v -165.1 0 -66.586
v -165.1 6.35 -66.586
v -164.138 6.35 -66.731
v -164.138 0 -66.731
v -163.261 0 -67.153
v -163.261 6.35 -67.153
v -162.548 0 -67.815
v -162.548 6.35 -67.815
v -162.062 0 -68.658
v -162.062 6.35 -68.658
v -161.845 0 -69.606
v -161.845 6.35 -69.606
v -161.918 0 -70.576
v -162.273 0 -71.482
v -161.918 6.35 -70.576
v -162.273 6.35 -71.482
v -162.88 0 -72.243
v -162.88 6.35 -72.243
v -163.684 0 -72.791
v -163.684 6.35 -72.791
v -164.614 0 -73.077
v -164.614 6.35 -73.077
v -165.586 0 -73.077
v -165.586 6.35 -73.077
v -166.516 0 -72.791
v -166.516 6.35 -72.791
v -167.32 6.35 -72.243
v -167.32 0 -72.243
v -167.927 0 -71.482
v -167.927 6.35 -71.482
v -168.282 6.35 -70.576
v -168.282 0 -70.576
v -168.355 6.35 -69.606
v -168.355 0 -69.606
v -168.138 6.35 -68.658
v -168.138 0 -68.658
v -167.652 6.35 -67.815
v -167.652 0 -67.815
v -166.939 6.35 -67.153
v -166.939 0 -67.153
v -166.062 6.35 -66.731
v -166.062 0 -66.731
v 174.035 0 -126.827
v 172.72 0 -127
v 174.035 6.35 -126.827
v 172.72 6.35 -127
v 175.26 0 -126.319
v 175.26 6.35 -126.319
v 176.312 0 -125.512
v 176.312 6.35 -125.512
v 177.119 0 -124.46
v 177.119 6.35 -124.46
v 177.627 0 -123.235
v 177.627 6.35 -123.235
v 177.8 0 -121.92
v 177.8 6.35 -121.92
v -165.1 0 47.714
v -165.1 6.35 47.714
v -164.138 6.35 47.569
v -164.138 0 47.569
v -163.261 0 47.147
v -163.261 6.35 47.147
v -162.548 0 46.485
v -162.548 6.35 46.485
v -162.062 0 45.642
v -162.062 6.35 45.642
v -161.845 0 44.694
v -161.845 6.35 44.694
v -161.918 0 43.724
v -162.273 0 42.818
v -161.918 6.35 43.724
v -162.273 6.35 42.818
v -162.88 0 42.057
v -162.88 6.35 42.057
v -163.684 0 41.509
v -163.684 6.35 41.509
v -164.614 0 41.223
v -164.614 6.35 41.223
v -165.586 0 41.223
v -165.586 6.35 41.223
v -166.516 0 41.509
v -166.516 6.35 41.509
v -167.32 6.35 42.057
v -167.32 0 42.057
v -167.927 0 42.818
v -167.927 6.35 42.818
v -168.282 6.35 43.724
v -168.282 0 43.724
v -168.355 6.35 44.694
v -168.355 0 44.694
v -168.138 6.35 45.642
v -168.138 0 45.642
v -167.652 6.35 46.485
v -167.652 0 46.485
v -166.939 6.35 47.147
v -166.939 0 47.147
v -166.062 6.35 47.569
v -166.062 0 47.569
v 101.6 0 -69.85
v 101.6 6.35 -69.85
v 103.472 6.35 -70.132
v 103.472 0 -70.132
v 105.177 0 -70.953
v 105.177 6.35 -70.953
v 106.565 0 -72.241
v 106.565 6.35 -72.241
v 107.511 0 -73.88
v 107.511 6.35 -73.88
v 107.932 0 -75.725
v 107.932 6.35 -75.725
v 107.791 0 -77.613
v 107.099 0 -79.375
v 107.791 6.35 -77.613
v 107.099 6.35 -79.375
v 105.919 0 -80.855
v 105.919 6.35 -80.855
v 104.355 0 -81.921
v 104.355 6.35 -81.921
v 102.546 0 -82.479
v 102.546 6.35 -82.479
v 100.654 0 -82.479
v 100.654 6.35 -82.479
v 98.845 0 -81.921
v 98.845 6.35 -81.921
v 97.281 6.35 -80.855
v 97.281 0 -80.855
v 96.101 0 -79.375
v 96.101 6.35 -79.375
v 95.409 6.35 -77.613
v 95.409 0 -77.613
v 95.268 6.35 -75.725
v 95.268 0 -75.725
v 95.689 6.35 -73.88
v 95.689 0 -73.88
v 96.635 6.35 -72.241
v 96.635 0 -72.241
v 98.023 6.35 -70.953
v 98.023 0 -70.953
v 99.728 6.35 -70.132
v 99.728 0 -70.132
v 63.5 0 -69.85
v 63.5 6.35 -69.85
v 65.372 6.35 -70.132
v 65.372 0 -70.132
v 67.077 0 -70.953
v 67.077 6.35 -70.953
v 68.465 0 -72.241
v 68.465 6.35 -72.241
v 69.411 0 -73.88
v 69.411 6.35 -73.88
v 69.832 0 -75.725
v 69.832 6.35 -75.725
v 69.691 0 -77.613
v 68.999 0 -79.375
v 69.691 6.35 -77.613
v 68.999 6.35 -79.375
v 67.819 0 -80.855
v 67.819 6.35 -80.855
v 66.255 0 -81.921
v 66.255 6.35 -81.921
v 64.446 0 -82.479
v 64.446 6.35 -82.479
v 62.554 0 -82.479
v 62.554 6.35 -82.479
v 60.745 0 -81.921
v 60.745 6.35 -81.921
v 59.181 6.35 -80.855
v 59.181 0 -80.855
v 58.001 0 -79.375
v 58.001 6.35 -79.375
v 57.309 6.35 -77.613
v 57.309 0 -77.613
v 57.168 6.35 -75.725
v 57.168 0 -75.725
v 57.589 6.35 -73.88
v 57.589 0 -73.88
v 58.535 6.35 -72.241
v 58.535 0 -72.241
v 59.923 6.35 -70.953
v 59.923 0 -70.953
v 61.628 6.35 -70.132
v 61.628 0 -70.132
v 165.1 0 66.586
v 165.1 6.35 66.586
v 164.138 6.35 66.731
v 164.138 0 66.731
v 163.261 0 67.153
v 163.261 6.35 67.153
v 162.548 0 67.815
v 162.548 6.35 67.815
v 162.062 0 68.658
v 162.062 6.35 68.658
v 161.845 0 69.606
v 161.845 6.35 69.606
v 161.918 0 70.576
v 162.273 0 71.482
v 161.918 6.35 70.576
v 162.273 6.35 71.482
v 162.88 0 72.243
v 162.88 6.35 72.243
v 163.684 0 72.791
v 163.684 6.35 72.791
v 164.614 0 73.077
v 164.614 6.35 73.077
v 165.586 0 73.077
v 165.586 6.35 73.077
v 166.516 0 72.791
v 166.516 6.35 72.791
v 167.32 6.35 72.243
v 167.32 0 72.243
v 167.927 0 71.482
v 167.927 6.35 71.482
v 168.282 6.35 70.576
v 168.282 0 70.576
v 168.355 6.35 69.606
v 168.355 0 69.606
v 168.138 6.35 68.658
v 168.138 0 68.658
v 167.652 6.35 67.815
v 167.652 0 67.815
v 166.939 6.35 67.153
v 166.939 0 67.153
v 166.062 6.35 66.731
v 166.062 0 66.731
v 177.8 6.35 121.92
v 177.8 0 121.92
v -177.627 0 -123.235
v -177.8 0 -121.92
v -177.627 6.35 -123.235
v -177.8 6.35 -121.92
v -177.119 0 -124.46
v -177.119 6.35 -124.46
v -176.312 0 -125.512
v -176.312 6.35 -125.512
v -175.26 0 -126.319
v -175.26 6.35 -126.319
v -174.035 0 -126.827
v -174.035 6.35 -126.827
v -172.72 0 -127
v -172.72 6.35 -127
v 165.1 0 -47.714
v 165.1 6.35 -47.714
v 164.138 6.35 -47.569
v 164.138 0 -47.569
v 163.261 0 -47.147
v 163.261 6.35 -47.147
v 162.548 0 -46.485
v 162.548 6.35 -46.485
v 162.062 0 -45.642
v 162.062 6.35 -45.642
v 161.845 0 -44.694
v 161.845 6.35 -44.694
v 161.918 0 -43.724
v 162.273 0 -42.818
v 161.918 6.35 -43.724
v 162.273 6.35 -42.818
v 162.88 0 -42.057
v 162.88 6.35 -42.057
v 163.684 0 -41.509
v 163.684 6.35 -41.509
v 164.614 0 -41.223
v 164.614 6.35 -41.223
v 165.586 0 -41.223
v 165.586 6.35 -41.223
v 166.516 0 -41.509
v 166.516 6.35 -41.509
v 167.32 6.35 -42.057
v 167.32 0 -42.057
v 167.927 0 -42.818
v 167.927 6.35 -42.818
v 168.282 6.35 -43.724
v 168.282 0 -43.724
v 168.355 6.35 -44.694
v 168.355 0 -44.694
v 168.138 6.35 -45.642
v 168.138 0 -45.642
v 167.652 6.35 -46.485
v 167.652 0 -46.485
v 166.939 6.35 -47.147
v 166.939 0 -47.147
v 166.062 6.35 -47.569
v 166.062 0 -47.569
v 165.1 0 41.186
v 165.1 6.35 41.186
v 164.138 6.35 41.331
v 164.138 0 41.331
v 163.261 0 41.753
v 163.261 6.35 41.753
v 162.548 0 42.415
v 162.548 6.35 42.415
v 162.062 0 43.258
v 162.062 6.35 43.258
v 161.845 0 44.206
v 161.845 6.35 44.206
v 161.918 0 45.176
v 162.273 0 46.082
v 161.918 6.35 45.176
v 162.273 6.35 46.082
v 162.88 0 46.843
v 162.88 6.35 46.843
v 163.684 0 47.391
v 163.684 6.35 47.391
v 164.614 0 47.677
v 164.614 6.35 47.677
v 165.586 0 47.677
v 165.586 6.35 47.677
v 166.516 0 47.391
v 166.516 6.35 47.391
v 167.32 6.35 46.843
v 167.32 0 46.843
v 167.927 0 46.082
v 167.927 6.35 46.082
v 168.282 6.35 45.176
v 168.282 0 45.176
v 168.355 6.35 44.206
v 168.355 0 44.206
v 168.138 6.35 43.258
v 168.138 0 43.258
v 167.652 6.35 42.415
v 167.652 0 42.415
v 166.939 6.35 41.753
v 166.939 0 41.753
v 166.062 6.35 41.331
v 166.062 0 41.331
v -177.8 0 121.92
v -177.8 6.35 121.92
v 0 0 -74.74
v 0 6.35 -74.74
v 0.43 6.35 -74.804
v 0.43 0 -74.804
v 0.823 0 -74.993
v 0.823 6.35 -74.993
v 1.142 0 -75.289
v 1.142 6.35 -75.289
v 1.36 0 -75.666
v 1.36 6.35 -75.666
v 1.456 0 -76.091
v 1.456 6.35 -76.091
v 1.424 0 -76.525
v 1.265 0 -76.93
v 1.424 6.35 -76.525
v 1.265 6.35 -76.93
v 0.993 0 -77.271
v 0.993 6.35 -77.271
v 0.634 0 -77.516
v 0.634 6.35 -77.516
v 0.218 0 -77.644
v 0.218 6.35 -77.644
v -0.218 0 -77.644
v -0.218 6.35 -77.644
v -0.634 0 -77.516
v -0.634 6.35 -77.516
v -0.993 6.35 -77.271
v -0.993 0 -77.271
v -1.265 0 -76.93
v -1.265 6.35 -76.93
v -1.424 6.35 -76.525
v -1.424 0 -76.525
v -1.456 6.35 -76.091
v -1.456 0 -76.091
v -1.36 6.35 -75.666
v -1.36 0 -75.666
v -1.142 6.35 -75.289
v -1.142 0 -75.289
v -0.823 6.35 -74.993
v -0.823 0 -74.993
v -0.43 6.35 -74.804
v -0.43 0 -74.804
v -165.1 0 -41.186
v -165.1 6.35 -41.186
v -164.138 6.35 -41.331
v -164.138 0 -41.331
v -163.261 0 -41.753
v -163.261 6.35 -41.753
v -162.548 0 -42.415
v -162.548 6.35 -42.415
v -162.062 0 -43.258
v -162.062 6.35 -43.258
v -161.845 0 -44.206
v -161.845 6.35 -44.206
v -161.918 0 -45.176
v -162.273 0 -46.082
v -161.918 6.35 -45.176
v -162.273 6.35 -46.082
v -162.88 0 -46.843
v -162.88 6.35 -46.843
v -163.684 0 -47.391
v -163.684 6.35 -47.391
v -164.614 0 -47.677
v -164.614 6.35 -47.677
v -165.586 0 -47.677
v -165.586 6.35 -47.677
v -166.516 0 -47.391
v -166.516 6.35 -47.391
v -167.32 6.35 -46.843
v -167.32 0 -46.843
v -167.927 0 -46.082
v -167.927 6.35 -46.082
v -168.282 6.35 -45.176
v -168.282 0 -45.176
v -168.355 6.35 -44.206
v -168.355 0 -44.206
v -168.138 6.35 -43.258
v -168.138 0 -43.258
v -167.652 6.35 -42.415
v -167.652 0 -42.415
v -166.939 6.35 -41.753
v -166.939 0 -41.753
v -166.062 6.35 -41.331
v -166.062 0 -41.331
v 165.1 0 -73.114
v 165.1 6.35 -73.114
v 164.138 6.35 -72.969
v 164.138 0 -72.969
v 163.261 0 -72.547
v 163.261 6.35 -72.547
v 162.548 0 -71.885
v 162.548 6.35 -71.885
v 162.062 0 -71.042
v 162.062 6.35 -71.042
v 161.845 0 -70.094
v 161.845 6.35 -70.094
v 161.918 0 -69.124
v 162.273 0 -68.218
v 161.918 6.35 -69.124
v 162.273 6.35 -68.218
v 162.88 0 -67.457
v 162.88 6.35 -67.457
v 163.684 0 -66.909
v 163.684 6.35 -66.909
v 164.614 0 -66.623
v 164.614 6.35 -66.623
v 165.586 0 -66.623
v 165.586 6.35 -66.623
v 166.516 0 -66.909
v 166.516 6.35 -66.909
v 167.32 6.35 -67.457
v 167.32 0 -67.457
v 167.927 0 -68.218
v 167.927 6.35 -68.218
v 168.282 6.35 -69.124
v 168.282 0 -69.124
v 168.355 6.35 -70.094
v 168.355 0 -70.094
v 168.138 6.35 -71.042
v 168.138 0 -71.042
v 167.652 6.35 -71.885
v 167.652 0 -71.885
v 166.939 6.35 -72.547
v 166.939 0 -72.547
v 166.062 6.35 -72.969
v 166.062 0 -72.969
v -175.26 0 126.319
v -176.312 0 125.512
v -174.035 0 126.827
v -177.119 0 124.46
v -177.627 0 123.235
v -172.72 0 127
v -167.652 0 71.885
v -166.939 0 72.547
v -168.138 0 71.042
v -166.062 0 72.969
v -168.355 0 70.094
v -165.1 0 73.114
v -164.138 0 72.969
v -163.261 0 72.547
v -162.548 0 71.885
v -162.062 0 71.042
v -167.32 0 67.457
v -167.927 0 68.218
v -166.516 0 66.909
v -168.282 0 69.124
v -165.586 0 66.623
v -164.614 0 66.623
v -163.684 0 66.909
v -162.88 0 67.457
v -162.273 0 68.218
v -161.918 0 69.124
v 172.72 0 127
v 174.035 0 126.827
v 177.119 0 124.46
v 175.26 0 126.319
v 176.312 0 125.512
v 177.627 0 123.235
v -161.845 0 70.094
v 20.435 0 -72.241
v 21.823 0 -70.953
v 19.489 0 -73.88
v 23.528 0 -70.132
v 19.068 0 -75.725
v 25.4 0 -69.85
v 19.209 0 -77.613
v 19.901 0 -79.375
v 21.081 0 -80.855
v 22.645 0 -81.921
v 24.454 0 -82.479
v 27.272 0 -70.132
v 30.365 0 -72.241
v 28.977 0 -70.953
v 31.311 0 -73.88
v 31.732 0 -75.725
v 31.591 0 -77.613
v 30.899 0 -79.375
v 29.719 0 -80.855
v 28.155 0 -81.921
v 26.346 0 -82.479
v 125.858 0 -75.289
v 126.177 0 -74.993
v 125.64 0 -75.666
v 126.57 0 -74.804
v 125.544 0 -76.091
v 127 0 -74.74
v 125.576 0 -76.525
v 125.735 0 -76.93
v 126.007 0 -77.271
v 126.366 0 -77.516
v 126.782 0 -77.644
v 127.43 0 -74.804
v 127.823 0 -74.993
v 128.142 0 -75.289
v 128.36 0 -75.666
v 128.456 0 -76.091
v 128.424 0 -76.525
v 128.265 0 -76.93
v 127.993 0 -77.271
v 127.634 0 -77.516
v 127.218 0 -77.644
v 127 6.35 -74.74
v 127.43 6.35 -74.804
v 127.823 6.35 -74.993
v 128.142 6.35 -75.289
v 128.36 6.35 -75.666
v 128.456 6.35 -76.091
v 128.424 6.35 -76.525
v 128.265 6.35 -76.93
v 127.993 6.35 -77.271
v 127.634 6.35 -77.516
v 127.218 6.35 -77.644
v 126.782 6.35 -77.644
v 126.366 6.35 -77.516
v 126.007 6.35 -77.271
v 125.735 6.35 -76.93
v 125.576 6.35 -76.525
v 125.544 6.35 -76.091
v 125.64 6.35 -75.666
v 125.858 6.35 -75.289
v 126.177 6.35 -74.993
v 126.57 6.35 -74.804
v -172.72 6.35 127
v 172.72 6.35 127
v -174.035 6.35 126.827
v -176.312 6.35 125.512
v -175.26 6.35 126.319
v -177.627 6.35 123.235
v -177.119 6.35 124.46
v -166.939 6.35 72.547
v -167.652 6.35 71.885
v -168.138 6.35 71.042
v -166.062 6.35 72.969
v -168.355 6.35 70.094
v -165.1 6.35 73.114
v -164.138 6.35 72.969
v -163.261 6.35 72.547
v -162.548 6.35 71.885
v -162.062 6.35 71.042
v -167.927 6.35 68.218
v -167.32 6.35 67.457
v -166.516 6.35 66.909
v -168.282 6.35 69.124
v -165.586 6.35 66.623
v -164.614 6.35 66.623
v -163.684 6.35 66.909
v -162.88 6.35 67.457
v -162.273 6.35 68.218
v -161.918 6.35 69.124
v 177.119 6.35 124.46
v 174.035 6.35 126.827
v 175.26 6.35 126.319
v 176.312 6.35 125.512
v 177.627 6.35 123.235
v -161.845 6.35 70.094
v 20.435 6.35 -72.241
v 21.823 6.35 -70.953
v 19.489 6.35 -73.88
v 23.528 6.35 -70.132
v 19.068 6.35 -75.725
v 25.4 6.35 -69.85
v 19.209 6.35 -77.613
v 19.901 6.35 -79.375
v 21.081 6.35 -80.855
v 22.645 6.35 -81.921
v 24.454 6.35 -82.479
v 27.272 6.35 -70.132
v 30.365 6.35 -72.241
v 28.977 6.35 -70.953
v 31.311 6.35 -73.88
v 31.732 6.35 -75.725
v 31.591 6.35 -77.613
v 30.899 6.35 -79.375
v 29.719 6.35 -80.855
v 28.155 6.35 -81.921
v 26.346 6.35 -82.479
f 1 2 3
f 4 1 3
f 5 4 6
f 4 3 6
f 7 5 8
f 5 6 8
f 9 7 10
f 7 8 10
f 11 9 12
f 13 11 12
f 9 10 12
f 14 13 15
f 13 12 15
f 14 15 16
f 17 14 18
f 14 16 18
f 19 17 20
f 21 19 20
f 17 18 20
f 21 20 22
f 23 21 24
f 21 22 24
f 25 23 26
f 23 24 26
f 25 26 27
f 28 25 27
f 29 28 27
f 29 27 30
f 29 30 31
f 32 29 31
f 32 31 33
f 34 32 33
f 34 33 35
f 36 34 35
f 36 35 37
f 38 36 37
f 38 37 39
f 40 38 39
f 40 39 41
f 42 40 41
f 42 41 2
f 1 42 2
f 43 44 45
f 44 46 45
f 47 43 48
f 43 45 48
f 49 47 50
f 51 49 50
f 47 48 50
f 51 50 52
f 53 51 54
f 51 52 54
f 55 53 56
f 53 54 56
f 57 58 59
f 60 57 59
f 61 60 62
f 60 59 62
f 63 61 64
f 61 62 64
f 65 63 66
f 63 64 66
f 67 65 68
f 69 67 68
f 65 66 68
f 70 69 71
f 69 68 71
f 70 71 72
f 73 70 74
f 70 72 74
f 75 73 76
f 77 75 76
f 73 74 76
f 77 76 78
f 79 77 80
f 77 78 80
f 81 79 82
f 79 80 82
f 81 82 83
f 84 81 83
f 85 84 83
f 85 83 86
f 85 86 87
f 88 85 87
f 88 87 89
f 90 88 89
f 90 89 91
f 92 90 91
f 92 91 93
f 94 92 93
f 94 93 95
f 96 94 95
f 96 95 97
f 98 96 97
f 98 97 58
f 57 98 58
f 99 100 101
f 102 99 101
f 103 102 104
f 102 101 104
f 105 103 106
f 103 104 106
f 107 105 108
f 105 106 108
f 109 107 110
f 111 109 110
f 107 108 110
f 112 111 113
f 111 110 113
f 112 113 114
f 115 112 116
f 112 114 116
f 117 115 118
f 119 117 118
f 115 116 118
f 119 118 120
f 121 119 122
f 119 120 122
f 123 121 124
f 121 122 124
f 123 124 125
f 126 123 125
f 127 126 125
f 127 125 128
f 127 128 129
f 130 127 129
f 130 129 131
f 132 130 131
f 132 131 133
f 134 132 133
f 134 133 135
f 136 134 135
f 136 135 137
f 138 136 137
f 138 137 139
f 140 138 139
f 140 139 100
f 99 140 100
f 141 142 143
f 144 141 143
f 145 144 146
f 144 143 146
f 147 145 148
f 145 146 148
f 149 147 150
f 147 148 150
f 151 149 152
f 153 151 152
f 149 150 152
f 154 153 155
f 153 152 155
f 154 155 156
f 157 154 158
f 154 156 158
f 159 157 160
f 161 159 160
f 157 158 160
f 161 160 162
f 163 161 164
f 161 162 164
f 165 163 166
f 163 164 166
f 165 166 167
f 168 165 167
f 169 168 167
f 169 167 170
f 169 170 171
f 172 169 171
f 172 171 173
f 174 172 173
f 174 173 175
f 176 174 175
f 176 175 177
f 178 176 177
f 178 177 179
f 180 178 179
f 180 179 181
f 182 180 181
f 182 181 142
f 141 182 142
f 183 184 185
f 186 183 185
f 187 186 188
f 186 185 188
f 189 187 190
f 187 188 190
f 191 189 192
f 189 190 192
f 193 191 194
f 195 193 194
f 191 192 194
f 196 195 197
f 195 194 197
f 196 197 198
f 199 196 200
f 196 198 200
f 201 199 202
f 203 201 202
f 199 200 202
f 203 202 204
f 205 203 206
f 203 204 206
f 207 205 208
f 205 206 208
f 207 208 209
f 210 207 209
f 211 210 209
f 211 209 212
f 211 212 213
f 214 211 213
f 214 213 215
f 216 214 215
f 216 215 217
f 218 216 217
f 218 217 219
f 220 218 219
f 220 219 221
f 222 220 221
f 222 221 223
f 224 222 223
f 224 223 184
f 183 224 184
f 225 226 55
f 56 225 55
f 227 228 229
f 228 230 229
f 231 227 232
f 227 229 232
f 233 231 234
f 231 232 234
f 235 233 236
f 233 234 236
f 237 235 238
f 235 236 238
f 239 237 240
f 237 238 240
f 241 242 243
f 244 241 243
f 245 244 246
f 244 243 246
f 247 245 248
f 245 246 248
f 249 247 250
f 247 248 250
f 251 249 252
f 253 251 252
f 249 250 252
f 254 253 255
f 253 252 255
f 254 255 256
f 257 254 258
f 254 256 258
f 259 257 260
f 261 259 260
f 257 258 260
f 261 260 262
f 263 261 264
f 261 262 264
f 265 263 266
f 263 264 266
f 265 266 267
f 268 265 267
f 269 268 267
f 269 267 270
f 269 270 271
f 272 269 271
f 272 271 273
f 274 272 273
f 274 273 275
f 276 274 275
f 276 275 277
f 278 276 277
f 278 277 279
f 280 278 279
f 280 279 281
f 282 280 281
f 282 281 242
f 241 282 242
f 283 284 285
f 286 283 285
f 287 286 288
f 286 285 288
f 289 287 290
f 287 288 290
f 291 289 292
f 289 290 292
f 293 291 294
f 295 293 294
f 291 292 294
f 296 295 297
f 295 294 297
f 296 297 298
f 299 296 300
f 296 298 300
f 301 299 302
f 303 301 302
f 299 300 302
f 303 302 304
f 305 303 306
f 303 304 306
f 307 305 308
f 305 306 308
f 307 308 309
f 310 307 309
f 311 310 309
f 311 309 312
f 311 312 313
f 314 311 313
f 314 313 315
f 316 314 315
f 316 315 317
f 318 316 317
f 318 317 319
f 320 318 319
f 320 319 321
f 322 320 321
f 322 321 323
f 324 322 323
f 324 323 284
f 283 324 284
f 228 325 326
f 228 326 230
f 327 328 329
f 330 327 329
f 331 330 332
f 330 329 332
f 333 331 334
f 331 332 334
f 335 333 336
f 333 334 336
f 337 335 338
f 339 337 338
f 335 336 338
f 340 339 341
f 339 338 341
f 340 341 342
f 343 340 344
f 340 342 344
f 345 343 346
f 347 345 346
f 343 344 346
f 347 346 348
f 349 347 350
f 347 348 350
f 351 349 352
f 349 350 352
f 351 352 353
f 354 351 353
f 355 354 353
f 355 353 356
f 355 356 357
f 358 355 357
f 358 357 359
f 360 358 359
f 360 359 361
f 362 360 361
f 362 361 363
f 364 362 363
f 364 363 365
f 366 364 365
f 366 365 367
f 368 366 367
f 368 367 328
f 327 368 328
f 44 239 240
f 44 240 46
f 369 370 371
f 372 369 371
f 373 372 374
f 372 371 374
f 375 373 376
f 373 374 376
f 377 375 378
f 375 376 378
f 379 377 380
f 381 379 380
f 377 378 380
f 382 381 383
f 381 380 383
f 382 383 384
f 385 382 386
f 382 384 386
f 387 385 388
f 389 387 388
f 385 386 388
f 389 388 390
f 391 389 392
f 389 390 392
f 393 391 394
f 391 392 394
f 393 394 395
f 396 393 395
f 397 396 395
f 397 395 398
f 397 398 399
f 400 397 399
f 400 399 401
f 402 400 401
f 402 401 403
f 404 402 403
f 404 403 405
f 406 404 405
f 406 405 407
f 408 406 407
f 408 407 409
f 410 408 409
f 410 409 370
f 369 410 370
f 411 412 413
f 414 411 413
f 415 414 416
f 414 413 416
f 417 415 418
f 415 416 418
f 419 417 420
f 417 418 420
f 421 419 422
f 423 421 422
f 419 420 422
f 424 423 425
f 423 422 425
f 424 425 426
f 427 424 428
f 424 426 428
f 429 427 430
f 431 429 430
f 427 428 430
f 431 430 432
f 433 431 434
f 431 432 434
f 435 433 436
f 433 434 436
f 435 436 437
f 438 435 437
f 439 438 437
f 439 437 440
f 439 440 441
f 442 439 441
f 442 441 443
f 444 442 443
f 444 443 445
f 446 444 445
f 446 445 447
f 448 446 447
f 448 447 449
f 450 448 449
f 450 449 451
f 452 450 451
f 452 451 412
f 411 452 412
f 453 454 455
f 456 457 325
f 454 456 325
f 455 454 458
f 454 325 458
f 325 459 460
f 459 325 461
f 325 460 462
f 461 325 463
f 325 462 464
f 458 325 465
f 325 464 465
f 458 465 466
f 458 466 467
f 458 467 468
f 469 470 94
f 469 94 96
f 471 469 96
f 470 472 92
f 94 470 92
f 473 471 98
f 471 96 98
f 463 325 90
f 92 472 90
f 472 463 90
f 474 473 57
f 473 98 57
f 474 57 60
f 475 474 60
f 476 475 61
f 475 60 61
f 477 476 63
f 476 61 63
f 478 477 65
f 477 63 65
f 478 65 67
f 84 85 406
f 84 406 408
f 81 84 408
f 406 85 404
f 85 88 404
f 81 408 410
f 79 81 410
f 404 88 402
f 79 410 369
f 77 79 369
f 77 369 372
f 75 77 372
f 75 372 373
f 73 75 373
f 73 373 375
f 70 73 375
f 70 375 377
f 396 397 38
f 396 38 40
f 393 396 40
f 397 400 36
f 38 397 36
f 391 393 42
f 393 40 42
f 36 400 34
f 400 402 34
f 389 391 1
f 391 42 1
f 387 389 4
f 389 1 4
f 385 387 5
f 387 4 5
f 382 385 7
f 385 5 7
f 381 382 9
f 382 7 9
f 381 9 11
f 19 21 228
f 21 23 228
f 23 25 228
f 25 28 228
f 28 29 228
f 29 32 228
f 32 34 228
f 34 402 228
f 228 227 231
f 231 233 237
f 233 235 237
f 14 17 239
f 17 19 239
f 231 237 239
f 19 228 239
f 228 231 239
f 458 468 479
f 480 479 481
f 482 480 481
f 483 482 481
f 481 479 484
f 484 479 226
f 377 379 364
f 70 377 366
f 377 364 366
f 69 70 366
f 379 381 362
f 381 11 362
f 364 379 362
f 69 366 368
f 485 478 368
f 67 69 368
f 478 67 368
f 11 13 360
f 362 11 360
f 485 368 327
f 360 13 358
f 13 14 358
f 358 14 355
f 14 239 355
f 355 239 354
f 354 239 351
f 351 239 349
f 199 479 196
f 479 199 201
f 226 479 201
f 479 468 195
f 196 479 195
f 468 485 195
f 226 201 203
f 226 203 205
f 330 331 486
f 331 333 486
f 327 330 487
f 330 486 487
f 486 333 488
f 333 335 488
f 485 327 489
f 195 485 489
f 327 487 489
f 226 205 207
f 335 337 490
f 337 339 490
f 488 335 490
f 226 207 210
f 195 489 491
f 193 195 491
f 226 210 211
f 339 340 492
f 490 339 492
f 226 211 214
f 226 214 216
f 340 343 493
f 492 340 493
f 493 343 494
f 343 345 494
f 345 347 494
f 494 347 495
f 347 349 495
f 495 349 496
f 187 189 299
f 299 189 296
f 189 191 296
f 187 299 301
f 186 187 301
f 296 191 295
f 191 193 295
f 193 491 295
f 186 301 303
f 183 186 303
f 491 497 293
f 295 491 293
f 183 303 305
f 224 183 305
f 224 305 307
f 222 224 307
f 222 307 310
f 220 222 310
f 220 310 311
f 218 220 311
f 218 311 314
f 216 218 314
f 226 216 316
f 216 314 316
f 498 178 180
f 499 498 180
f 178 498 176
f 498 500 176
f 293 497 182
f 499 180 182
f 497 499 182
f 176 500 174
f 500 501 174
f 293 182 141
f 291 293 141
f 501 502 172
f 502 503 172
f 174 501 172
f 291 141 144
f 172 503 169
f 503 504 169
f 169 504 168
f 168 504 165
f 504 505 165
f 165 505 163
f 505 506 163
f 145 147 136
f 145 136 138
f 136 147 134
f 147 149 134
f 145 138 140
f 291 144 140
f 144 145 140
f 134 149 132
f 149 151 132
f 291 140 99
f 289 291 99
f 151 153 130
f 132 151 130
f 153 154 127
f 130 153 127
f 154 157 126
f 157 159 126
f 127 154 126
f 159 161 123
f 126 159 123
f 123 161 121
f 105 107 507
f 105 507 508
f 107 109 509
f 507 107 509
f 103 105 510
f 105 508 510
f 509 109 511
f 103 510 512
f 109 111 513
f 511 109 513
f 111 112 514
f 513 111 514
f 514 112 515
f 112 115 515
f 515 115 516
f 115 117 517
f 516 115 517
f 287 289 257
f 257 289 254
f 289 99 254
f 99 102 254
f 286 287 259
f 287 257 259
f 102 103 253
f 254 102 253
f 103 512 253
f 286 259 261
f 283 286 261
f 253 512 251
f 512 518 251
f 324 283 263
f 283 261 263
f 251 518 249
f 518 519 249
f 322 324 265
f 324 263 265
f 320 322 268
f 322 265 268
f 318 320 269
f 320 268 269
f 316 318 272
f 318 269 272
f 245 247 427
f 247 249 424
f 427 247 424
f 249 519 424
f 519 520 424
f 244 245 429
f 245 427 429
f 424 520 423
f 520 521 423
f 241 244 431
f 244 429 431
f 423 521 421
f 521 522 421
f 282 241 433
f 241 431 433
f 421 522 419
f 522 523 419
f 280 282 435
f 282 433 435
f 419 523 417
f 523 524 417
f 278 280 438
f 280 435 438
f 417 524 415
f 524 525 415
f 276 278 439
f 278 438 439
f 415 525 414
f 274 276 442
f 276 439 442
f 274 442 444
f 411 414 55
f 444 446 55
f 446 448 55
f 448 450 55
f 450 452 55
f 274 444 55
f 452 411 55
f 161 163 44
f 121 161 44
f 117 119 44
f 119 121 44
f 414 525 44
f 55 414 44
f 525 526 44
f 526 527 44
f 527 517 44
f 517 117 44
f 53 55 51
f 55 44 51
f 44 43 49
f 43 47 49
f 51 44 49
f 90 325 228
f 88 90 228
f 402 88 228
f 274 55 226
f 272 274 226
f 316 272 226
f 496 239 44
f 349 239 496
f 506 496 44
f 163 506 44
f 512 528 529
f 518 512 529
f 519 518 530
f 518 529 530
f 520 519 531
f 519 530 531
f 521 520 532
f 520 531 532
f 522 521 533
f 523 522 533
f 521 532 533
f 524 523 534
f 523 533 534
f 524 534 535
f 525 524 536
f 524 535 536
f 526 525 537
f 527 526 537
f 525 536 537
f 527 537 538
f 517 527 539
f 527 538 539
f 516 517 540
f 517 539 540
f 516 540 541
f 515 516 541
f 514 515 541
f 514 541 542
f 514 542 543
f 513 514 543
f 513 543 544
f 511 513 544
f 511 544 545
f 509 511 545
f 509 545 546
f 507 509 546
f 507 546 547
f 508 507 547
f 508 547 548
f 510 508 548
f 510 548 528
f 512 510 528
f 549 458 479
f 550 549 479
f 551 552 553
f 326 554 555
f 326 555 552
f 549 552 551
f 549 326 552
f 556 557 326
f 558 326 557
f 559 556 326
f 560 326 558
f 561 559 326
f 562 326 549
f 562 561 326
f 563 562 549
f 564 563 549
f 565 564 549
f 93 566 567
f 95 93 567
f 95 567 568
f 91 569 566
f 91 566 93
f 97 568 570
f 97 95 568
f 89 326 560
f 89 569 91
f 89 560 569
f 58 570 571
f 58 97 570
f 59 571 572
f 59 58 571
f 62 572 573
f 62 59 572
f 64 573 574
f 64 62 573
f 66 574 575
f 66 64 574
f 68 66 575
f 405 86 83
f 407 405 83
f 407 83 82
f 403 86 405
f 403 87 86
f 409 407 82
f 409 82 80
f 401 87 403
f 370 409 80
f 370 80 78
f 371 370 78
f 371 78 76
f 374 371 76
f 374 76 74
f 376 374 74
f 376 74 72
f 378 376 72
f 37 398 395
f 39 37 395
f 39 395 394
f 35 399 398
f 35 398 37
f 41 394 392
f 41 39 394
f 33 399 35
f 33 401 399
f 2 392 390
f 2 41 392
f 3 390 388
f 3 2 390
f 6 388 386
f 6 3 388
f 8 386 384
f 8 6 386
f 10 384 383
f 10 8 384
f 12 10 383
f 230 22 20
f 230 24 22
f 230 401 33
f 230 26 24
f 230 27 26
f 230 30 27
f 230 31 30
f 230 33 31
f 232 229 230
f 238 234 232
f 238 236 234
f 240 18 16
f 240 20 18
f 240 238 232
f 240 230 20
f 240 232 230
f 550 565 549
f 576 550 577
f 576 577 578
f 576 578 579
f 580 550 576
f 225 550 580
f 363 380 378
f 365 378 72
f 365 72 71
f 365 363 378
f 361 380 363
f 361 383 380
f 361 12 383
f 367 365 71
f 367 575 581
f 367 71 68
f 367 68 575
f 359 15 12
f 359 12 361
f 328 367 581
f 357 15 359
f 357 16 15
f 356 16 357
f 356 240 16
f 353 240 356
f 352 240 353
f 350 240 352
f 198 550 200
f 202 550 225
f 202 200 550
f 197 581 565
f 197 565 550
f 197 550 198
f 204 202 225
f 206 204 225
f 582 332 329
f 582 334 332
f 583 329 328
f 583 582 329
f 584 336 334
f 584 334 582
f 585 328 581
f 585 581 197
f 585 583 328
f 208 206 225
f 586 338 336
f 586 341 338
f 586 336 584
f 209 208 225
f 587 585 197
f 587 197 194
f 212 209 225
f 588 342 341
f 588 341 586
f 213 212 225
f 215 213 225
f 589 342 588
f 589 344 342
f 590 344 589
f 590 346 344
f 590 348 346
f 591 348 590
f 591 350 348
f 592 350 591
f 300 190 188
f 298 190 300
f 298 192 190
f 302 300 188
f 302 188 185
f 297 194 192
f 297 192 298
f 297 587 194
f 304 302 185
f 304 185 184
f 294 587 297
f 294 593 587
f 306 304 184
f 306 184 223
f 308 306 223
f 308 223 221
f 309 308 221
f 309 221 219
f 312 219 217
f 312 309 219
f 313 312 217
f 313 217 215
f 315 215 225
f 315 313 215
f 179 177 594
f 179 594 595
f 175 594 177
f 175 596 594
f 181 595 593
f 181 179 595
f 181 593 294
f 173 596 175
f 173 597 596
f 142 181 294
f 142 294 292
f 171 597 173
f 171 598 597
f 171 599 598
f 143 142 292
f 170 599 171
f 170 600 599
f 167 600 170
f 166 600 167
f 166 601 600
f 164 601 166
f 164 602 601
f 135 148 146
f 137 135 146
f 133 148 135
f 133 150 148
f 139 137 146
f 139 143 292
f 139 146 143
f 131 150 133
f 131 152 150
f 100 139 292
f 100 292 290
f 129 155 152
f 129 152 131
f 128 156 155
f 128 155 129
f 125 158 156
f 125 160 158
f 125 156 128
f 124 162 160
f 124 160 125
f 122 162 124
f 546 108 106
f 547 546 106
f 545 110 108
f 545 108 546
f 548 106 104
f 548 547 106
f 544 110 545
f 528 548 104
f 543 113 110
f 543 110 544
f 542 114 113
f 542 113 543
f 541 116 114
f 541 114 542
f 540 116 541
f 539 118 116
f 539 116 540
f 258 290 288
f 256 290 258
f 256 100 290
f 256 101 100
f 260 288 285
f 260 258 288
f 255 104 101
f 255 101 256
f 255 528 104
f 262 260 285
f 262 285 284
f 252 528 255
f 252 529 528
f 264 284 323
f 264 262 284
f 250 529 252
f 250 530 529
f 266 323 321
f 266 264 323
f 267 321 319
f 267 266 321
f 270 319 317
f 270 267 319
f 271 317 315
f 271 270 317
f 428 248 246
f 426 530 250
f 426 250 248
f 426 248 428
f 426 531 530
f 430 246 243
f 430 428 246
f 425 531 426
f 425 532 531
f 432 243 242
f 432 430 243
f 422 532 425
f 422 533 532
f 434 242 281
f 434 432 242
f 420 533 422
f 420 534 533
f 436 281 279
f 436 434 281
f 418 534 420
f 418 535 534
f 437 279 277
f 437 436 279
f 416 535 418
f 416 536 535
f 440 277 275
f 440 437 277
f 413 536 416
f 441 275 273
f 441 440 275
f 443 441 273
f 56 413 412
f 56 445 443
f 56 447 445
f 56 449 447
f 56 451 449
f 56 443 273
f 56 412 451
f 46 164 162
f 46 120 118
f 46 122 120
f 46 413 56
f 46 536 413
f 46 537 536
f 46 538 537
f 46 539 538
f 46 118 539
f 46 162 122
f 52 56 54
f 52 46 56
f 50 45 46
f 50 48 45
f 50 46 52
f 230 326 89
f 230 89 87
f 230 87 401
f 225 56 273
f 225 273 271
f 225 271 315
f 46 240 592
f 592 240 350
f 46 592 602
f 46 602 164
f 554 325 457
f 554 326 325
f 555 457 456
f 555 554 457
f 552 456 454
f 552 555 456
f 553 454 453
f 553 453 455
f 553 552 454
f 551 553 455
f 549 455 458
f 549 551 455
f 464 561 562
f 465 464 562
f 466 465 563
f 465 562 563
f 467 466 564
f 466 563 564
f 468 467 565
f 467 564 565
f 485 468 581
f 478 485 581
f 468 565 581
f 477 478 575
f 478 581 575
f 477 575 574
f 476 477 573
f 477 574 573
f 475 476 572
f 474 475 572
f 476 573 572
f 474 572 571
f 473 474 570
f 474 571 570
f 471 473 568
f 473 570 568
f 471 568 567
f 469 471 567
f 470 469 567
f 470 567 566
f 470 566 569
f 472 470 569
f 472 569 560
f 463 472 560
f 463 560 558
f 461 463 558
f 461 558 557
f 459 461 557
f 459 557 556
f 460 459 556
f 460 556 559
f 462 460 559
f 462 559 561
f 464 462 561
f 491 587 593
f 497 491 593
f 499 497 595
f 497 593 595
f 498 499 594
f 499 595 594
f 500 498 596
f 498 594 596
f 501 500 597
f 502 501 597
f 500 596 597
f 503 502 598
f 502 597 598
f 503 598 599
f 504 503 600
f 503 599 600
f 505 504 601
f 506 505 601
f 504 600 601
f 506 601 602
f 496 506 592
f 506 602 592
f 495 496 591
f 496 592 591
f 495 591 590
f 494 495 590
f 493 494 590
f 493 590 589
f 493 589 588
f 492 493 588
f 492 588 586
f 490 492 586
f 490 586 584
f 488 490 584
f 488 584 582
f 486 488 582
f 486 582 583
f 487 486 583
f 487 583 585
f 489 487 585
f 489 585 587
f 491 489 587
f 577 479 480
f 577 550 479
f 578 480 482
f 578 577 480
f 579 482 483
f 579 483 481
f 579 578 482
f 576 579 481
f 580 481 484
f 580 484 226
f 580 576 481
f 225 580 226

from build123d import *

# Parameters (mm, degrees)
SKETCH1_W             = 355.6
SKETCH1_H             = 254
BOSS_EXTRUDE1_DEPTH   = 6.35
SKETCH4_R             = 3.2639
CUT_EXTRUDE3_DEPTH    = 219.591313871
SKETCH5_R             = 6.35
SWITCH_MOUNTING_DEPTH = 219.591313871
SKETCH6_R             = 1.4605
CUT_EXTRUDE4_DEPTH    = 219.591313871
FILLET2_R             = 5.08


with BuildPart() as part:
    # Sketch1 → Boss-Extrude1 (new body)
    with BuildSketch(Plane(origin=(0, 0, 0), x_dir=(1, 0, 0), z_dir=(0, 1, 0))):
        Rectangle(SKETCH1_W, SKETCH1_H)
    extrude(amount=BOSS_EXTRUDE1_DEPTH)

    # Sketch4 → Cut-Extrude3 (cut, through all)
    with BuildSketch(Plane(origin=(0, 6.35, 0), x_dir=(1, 0, 0), z_dir=(0, 1, 0))):
        with Locations(Location((-165.1, 69.85, 0), (0, 0, 270))):
            Circle(SKETCH4_R)
        with Locations(Location((-165.1, 44.45, 0), (0, 0, 270))):
            Circle(SKETCH4_R)
        with Locations(Location((-165.1, -44.45, 0), (0, 0, 270))):
            Circle(SKETCH4_R)
        with Locations(Location((-165.1, -69.85, 0), (0, 0, 270))):
            Circle(SKETCH4_R)
        with Locations(Location((165.1, -69.85, 0), (0, 0, 90))):
            Circle(SKETCH4_R)
        with Locations(Location((165.1, -44.45, 0), (0, 0, 90))):
            Circle(SKETCH4_R)
        with Locations(Location((165.1, 44.45, 0), (0, 0, 90))):
            Circle(SKETCH4_R)
        with Locations(Location((165.1, 69.85, 0), (0, 0, 90))):
            Circle(SKETCH4_R)
    extrude(amount=-CUT_EXTRUDE3_DEPTH, mode=Mode.SUBTRACT)

    # Sketch5 → Switch Mounting (cut, through all)
    with BuildSketch(Plane(origin=(0, 6.35, 0), x_dir=(1, 0, 0), z_dir=(0, 1, 0))):
        with Locations(Location((25.4, 76.2, 0), (0, 0, 270))):
            Circle(SKETCH5_R)
        with Locations(Location((63.5, 76.2, 0), (0, 0, 270))):
            Circle(SKETCH5_R)
        with Locations(Location((101.6, 76.2, 0), (0, 0, 270))):
            Circle(SKETCH5_R)
    extrude(amount=-SWITCH_MOUNTING_DEPTH, mode=Mode.SUBTRACT)

    # Sketch6 → Cut-Extrude4 (cut, through all)
    with BuildSketch(Plane(origin=(0, 6.35, 0), x_dir=(1, 0, 0), z_dir=(0, 1, 0))):
        with Locations(Location((127, 76.2, 0), (0, 0, 270))):
            Circle(SKETCH6_R)
        with Locations(Location((0, 76.2, 0), (0, 0, 270))):
            Circle(SKETCH6_R)
    extrude(amount=-CUT_EXTRUDE4_DEPTH, mode=Mode.SUBTRACT)

    # Fillet2
    fillet2_edges = [part.edges().sort_by_distance(p)[0] for p in [
        (177.8, 3.175, 127),
        (-177.8, 3.175, 127),
        (-177.8, 3.175, -127),
        (177.8, 3.175, -127),
    ]]
    fillet(fillet2_edges, radius=FILLET2_R)


solid = part.part
